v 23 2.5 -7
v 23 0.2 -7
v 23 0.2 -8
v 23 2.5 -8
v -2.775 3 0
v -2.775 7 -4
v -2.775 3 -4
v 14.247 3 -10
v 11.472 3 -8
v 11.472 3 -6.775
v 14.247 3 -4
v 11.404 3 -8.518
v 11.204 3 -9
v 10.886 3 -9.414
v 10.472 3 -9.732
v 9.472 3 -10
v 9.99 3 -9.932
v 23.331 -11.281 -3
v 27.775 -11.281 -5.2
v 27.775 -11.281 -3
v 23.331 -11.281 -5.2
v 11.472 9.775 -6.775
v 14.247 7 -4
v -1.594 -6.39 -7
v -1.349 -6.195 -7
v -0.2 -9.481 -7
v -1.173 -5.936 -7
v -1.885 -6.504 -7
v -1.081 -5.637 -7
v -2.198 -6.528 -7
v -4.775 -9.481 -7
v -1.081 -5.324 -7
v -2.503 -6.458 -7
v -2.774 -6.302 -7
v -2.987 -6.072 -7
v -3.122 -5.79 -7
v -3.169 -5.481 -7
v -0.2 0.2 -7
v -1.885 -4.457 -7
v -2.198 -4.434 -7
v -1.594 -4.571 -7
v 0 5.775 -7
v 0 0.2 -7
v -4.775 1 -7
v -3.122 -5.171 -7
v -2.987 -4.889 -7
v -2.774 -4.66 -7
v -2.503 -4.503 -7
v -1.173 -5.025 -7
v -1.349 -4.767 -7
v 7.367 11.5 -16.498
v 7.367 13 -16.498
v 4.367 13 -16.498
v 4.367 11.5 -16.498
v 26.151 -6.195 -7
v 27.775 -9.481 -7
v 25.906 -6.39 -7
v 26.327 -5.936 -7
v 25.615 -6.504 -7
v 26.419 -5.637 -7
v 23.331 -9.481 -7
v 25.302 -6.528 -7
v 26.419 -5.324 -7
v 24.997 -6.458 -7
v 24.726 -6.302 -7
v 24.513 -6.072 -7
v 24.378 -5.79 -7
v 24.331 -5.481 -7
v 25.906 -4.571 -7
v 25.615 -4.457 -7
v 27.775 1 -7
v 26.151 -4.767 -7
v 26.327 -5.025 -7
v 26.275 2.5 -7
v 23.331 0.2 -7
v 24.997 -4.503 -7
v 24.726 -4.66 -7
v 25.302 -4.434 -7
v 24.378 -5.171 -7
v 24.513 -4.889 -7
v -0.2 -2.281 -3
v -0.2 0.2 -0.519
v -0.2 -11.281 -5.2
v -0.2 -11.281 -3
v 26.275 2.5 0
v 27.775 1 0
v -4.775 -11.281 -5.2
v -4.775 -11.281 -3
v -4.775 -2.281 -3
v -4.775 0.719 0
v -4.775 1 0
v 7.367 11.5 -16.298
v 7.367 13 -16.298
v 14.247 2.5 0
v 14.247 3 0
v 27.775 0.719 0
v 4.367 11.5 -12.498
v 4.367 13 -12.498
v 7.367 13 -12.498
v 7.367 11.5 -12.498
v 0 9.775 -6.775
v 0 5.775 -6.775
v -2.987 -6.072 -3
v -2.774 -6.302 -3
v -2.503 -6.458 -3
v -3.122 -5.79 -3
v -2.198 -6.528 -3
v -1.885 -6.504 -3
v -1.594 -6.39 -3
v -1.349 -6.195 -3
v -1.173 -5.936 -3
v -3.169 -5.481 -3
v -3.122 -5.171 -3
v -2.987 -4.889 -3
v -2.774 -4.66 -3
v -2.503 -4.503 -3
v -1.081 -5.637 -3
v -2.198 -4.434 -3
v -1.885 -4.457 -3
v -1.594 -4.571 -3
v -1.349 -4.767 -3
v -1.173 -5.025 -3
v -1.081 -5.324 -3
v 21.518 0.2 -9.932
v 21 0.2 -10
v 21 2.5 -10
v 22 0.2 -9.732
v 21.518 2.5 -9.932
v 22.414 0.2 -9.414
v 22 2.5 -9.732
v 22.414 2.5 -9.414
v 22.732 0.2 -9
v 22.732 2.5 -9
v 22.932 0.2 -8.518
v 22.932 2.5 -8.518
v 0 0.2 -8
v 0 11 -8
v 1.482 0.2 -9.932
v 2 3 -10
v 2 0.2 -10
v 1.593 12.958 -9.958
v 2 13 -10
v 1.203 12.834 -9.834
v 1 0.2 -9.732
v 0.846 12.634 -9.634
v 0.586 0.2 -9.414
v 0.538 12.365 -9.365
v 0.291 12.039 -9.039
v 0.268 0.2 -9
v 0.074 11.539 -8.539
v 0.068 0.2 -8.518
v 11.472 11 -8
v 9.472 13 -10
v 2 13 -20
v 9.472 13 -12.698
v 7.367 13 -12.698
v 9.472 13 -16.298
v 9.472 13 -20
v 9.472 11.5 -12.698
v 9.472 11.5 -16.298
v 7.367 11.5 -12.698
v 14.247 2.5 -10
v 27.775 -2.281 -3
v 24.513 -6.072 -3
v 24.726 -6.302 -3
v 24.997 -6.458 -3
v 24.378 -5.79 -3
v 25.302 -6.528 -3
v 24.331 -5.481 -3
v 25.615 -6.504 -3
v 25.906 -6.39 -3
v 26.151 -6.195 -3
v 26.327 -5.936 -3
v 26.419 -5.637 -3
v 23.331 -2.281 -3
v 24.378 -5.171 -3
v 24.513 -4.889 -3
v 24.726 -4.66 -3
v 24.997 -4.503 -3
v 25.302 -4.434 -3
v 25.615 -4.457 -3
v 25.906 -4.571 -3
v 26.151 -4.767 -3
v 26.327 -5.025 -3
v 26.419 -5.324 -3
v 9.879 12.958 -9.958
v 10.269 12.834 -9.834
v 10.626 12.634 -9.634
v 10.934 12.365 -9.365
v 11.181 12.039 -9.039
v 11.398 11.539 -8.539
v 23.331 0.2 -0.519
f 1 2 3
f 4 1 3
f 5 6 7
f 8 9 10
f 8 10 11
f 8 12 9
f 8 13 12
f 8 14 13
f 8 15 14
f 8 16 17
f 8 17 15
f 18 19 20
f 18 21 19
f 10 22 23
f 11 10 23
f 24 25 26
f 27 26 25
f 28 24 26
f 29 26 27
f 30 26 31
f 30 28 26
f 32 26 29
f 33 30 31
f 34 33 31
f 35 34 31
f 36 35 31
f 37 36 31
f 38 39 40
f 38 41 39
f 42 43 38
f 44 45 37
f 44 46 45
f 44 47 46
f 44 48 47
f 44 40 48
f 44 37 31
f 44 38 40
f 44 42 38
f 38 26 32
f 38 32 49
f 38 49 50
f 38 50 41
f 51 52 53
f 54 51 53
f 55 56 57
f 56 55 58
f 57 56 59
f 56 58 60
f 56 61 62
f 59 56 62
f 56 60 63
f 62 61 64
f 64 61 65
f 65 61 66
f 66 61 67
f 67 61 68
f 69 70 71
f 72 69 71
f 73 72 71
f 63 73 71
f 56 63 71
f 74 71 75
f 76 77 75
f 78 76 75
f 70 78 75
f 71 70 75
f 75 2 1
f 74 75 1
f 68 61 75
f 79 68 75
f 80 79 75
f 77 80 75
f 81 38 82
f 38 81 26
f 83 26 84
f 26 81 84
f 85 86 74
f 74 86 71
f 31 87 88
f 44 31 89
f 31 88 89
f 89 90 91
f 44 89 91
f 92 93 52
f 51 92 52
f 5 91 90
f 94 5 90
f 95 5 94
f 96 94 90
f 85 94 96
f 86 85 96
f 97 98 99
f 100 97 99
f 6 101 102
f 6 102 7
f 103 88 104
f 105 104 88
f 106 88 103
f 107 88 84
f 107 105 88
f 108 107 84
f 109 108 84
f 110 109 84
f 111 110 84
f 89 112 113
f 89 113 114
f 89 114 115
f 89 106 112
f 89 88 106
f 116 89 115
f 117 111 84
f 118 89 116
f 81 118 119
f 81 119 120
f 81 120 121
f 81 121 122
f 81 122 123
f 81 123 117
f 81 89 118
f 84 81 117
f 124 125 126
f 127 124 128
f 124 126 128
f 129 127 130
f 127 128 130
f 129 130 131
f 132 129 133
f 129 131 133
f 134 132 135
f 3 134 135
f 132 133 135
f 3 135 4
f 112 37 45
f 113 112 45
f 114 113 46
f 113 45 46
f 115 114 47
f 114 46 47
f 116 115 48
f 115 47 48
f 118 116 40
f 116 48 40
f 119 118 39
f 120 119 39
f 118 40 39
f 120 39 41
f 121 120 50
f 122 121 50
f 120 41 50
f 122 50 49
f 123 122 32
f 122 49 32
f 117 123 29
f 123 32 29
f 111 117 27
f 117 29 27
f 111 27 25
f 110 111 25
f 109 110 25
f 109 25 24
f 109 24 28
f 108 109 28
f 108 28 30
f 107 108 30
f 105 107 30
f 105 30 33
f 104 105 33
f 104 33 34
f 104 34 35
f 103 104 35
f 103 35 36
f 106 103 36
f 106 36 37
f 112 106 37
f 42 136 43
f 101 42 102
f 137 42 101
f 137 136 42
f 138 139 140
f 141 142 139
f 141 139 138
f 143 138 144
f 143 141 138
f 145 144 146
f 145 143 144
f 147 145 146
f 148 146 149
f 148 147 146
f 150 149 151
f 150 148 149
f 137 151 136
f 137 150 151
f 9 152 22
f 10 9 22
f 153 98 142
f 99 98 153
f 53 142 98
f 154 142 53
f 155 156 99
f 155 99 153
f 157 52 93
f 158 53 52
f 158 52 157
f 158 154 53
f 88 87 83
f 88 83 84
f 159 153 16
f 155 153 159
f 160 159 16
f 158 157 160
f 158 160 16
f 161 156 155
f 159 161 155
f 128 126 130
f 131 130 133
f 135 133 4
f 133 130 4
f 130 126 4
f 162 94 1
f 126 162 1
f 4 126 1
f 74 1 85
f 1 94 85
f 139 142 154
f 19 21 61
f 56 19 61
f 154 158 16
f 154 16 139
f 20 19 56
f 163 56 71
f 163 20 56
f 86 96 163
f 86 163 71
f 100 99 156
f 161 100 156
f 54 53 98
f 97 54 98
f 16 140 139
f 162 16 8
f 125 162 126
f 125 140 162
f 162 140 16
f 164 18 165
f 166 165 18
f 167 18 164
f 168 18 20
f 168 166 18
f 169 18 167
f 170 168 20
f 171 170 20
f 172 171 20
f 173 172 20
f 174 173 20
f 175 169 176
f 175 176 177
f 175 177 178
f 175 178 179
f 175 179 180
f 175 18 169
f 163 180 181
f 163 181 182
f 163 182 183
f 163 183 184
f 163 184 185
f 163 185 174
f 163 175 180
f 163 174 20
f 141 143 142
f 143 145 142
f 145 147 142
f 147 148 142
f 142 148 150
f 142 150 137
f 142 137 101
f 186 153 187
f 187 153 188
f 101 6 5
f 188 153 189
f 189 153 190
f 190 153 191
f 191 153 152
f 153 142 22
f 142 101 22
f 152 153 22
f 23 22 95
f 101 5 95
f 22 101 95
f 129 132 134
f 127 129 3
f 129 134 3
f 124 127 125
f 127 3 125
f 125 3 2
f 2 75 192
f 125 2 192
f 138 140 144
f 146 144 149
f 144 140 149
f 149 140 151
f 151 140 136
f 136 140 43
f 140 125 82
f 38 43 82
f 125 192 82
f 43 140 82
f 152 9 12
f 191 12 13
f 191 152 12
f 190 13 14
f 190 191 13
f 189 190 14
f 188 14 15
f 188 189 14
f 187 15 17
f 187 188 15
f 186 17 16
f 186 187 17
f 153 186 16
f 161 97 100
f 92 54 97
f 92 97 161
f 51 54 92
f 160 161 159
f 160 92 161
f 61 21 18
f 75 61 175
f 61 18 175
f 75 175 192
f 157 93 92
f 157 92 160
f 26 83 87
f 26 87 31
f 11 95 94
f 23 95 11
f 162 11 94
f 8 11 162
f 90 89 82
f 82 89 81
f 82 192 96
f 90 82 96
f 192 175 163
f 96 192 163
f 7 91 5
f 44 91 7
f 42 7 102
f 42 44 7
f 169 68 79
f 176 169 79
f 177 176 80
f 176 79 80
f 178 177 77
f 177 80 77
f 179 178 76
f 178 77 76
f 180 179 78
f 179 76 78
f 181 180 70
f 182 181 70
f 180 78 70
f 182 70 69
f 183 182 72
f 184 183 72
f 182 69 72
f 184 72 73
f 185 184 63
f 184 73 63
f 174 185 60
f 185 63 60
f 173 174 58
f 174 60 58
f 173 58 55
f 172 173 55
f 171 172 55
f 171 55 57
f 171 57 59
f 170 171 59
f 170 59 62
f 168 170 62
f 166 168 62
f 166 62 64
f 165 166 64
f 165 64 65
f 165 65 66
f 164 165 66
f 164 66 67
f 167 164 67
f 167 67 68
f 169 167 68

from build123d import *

# Parameters (mm, degrees)
SKETCH1_W             = 23
SKETCH1_H             = 10
BOSS_EXTRUDE1_DEPTH   = 3
SKETCH2_W             = 7
SKETCH2_H             = 3
BOSS_EXTRUDE2_DEPTH   = 4.775
SKETCH3_W             = 7
SKETCH3_H             = 3
BOSS_EXTRUDE3_DEPTH   = 4.775
BOSS_EXTRUDE4_START   = -4.775
BOSS_EXTRUDE4_DEPTH   = 4.775
BOSS_EXTRUDE4_START_2 = 23.130914758
BOSS_EXTRUDE4_2_DEPTH = 4.644085242
SKETCH5_W             = 6.593837141
SKETCH5_H             = 7.601131285
CUT_EXTRUDE1_DEPTH    = 94
CUT_EXTRUDE2_DEPTH    = 94
SKETCH7_R             = 1.05
CUT_EXTRUDE3_DEPTH    = 94
FILLET1_R             = 2
CHAMFER2_SIZE         = 2
CHAMFER3_SIZE         = 2
BOSS_EXTRUDE5_START   = 10
SKETCH8_W             = 3.735996303
SKETCH8_H             = 10
BOSS_EXTRUDE5_DEPTH   = 10
SKETCH10_W            = 1.630996303
SKETCH10_H            = 4
SKETCH10_W_2          = 0.412454303
SKETCH10_H_2          = 2
CUT_EXTRUDE5_DEPTH    = 1.5
SKETCH11_W            = 2.105
SKETCH11_H            = 3.6
CUT_EXTRUDE6_DEPTH    = 1.5
SKETCH14_W            = 12.528007394
SKETCH14_H            = 0.5
CUT_EXTRUDE9_DEPTH    = 14
CHAMFER4_SIZE         = 10
CHAMFER5_SIZE         = 10
CHAMFER6_SIZE         = 3
SKETCH12_W            = 32.55
SKETCH12_H            = 6
CUT_EXTRUDE7_DEPTH    = 3
SKETCH13_W            = 32.55
SKETCH13_H            = 3
CUT_EXTRUDE8_DEPTH    = 3
CHAMFER7_SIZE         = 3


# Read off the part's stored shape, not the designer's step: Boss-Extrude4
# Some blends are built 0.0001 mm under size
with BuildPart() as part:
    # Sketch1 → Boss-Extrude1 (new body)
    with BuildSketch(Plane(origin=(0, 0, 0), x_dir=(1, 0, 0), z_dir=(0, 1, 0))):
        with Locations((11.5, 5)):
            Rectangle(SKETCH1_W, SKETCH1_H)
    extrude(amount=BOSS_EXTRUDE1_DEPTH)

    # Sketch2 → Boss-Extrude2 (add)
    with BuildSketch(Plane(origin=(23, 0, 0), x_dir=(0, 0, -1), z_dir=(1, 0, 0))):
        with Locations((3.5, 1.5)):
            Rectangle(SKETCH2_W, SKETCH2_H)
    extrude(amount=BOSS_EXTRUDE2_DEPTH)

    # Sketch3 → Boss-Extrude3 (add)
    with BuildSketch(Plane.ZY):
        with Locations((-3.5, 1.5)):
            Rectangle(SKETCH3_W, SKETCH3_H)
    extrude(amount=BOSS_EXTRUDE3_DEPTH)

    # Boss-Extrude4 outline → Boss-Extrude4 (add)
    with BuildSketch(Plane.YZ.offset(BOSS_EXTRUDE4_START)):
        Polygon((0, 0), (-16.48071009, 0), (-9.48071009, -7), (0, -7), align=None)
    extrude(amount=BOSS_EXTRUDE4_DEPTH)

    # Boss-Extrude4 2 outline → Boss-Extrude4 2 (add)
    with BuildSketch(Plane.YZ.offset(BOSS_EXTRUDE4_START_2)):
        Polygon((0, 0), (-16.48071009, 0), (-9.48071009, -7), (0, -7), align=None)
    extrude(amount=BOSS_EXTRUDE4_2_DEPTH)

    # Sketch5 → Cut-Extrude1 (cut)
    with BuildSketch(Plane.ZY.offset(4.775)):
        with Locations((-3.296918571, -15.081275732)):
            Rectangle(SKETCH5_W, SKETCH5_H)
    extrude(amount=-CUT_EXTRUDE1_DEPTH, mode=Mode.SUBTRACT)

    # Sketch6 → Cut-Extrude2 (cut)
    with BuildSketch(Plane.XY):
        Polygon((23.330914758, 0.2), (-0.2, 0.2), (-0.2, -11.28071009), (0, -11.28071009), (0, 0), (23.130914758, 0), (23.130914758, -11.28071009), (23.330914758, -11.28071009), align=None)
    extrude(amount=-CUT_EXTRUDE2_DEPTH, mode=Mode.SUBTRACT)

    # Sketch7 → Cut-Extrude3 (cut)
    with BuildSketch(Plane(origin=(0, 0, -7), x_dir=(-1, 0, 0), z_dir=(0, 0, -1))):
        with Locations((2.119085242, -5.48071009)):
            Circle(SKETCH7_R)
        with Locations((-25.380914758, -5.48071009)):
            Circle(SKETCH7_R)
    extrude(amount=-CUT_EXTRUDE3_DEPTH, mode=Mode.SUBTRACT)

    # Fillet1
    fillet1_edges = [part.edges().sort_by_distance(p)[0] for p in [
        (0, 1.6, -10),
        (23, 1.6, -10),
    ]]
    fillet(fillet1_edges, radius=FILLET1_R)

    # Chamfer2
    chamfer2_edges = [part.edges().sort_by_distance(p)[0] for p in [
        (27.775, 3, -3.5),
        (-4.775, 3, -3.5),
    ]]
    chamfer(chamfer2_edges, length=CHAMFER2_SIZE)

    # Chamfer3
    chamfer3_edges = [part.edges().sort_by_distance(p)[0] for p in [
        (25.552957379, -11.28071009, 0),
    ]]
    chamfer(chamfer3_edges, length=CHAMFER3_SIZE)

    # Sketch8 → Boss-Extrude5 (add)
    with BuildSketch(Plane(origin=(0, 3, 0), x_dir=(1, 0, 0), z_dir=(0, 1, 0)).offset(BOSS_EXTRUDE5_START)):
        with BuildLine():
            Line((9.471992606, 10), (5.735996303, 10))
            Line((5.735996303, 10), (5.735996303, 0))
            Line((5.735996303, 0), (14.246992606, 0))
            Line((14.246992606, 0), (14.246992606, 7))
            Line((14.246992606, 7), (11.471992606, 7))
            Line((11.471992606, 7), (11.471992606, 8))
            ThreePointArc((11.471992606, 8), (10.886206168, 9.414213562), (9.471992606, 10))
        make_face()
        with BuildLine():
            Line((5.735996303, 0), (5.735996303, 10))
            Line((5.735996303, 10), (2, 10))
            ThreePointArc((2, 10), (0.585786438, 9.414213562), (0, 8))
            Line((0, 8), (0, 7))
            Line((0, 7), (-2.775, 7))
            Line((-2.775, 7), (-2.775, 0))
            Line((-2.775, 0), (5.735996303, 0))
        make_face()
        with Locations((3.867998152, 15)):
            Rectangle(SKETCH8_W, SKETCH8_H)
        with Locations((7.603994455, 15)):
            Rectangle(SKETCH8_W, SKETCH8_H)
    extrude(amount=-BOSS_EXTRUDE5_DEPTH)

    # Sketch10 → Cut-Extrude5 (cut)
    with BuildSketch(Plane(origin=(0, 13, 0), x_dir=(1, 0, 0), z_dir=(0, 1, 0))):
        with Locations((6.551494455, 14.49800095)):
            Rectangle(SKETCH10_W, SKETCH10_H)
        with Locations((4.573219758, 13.49800095)):
            Rectangle(SKETCH10_W_2, SKETCH10_H_2)
        with Locations((4.573219758, 15.49800095)):
            Rectangle(SKETCH10_W_2, SKETCH10_H_2)
        Polygon((5.735996303, 16.49800095), (4.779446909, 16.49800095), (4.779446909, 14.49800095), (4.779446909, 12.49800095), (5.735996303, 12.49800095), align=None)
    extrude(amount=-CUT_EXTRUDE5_DEPTH, mode=Mode.SUBTRACT)

    # Sketch11 → Cut-Extrude6 (cut)
    with BuildSketch(Plane(origin=(0, 13, 0), x_dir=(1, 0, 0), z_dir=(0, 1, 0))):
        with Locations((8.419492606, 14.49800095)):
            Rectangle(SKETCH11_W, SKETCH11_H)
    extrude(amount=-CUT_EXTRUDE6_DEPTH, mode=Mode.SUBTRACT)

    # Sketch14 → Cut-Extrude9 (cut)
    with BuildSketch(Plane.XY):
        with Locations((20.510996303, 2.75)):
            Rectangle(SKETCH14_W, SKETCH14_H)
    extrude(amount=-CUT_EXTRUDE9_DEPTH, mode=Mode.SUBTRACT)

    # Chamfer4
    chamfer4_edges = [part.edges().sort_by_distance(p)[0] for p in [
        (5.735996303, 3, -20),
    ]]
    chamfer(chamfer4_edges, length=CHAMFER4_SIZE - 0.0001)  # a hair under: the kernel refuses the full size

    # Chamfer5
    chamfer5_edges = [part.edges().sort_by_distance(p)[0] for p in [
        (5.735996303, 13, 0),
    ]]
    chamfer(chamfer5_edges, length=CHAMFER5_SIZE)

    # Chamfer6
    # the kernel refuses this chamfer: 3 mm, written as the material it takes off along each edge
    with BuildSketch(Plane(origin=(-2.775, 17.715048964, -7), x_dir=(0.9996219169112968, 0, -0.02749587661058649), z_dir=(0, -1, 0))) as chamfer6_piece_1_section:
        Polygon((CHAMFER6_SIZE * 0.999621916911, CHAMFER6_SIZE * 0.0274958766106), (-CHAMFER6_SIZE * 0.0274958766106, CHAMFER6_SIZE * 0.999621916911), (0, 0), align=None)
    chamfer6_piece_1 = extrude(amount=22.430097928, mode=Mode.PRIVATE)
    chamfer6_piece_1 = split(chamfer6_piece_1, bisect_by=Plane(origin=(0, 7.74942321, -6.834490118), z_dir=(-1, 0, 0)), keep=Keep.TOP, mode=Mode.PRIVATE)
    chamfer6_piece_1 = split(chamfer6_piece_1, bisect_by=Plane(origin=(0.931889756, 6.706889756, -6.834490118), z_dir=(-0.7071067811865476, 0.7071067811865476, 0)), keep=Keep.TOP, mode=Mode.PRIVATE)
    add(chamfer6_piece_1, mode=Mode.SUBTRACT)
    with BuildSketch(Plane(origin=(14.246992606, 17.715048964, -7), x_dir=(-0.9996219169112969, 0, -0.027495876610586497), z_dir=(0, -1, 0))) as chamfer6_piece_2_section:
        Polygon((CHAMFER6_SIZE * 0.999621916911, -CHAMFER6_SIZE * 0.0274958766106), (-CHAMFER6_SIZE * 0.0274958766106, -CHAMFER6_SIZE * 0.999621916911), (0, 0), align=None)
    chamfer6_piece_2 = extrude(amount=14.715048964, mode=Mode.PRIVATE)
    chamfer6_piece_2 = split(chamfer6_piece_2, bisect_by=Plane(origin=(11.471992606, 6.038915357, -6.077830715), z_dir=(1, 0, 0)), keep=Keep.TOP, mode=Mode.PRIVATE)
    add(chamfer6_piece_2, mode=Mode.SUBTRACT)

    # Sketch12 → Cut-Extrude7 (cut)
    with BuildSketch(Plane.XY):
        with Locations((11.5, -5.28071009)):
            Rectangle(SKETCH12_W, SKETCH12_H)
    extrude(amount=-CUT_EXTRUDE7_DEPTH, mode=Mode.SUBTRACT)

    # Sketch13 → Cut-Extrude8 (cut)
    with BuildSketch(Plane(origin=(0, -8.28071009, 0), x_dir=(1, 0, 0), z_dir=(0, 1, 0))):
        with Locations((11.5, 1.5)):
            Rectangle(SKETCH13_W, SKETCH13_H)
    extrude(amount=-CUT_EXTRUDE8_DEPTH, mode=Mode.SUBTRACT)

    # Chamfer7
    chamfer7_edges = [part.edges().sort_by_distance(p)[0] for p in [
        (25.552957379, -2.28071009, 0),
    ]]
    chamfer(chamfer7_edges, length=CHAMFER7_SIZE - 0.0001)  # a hair under: the kernel refuses the full size


solid = part.part
